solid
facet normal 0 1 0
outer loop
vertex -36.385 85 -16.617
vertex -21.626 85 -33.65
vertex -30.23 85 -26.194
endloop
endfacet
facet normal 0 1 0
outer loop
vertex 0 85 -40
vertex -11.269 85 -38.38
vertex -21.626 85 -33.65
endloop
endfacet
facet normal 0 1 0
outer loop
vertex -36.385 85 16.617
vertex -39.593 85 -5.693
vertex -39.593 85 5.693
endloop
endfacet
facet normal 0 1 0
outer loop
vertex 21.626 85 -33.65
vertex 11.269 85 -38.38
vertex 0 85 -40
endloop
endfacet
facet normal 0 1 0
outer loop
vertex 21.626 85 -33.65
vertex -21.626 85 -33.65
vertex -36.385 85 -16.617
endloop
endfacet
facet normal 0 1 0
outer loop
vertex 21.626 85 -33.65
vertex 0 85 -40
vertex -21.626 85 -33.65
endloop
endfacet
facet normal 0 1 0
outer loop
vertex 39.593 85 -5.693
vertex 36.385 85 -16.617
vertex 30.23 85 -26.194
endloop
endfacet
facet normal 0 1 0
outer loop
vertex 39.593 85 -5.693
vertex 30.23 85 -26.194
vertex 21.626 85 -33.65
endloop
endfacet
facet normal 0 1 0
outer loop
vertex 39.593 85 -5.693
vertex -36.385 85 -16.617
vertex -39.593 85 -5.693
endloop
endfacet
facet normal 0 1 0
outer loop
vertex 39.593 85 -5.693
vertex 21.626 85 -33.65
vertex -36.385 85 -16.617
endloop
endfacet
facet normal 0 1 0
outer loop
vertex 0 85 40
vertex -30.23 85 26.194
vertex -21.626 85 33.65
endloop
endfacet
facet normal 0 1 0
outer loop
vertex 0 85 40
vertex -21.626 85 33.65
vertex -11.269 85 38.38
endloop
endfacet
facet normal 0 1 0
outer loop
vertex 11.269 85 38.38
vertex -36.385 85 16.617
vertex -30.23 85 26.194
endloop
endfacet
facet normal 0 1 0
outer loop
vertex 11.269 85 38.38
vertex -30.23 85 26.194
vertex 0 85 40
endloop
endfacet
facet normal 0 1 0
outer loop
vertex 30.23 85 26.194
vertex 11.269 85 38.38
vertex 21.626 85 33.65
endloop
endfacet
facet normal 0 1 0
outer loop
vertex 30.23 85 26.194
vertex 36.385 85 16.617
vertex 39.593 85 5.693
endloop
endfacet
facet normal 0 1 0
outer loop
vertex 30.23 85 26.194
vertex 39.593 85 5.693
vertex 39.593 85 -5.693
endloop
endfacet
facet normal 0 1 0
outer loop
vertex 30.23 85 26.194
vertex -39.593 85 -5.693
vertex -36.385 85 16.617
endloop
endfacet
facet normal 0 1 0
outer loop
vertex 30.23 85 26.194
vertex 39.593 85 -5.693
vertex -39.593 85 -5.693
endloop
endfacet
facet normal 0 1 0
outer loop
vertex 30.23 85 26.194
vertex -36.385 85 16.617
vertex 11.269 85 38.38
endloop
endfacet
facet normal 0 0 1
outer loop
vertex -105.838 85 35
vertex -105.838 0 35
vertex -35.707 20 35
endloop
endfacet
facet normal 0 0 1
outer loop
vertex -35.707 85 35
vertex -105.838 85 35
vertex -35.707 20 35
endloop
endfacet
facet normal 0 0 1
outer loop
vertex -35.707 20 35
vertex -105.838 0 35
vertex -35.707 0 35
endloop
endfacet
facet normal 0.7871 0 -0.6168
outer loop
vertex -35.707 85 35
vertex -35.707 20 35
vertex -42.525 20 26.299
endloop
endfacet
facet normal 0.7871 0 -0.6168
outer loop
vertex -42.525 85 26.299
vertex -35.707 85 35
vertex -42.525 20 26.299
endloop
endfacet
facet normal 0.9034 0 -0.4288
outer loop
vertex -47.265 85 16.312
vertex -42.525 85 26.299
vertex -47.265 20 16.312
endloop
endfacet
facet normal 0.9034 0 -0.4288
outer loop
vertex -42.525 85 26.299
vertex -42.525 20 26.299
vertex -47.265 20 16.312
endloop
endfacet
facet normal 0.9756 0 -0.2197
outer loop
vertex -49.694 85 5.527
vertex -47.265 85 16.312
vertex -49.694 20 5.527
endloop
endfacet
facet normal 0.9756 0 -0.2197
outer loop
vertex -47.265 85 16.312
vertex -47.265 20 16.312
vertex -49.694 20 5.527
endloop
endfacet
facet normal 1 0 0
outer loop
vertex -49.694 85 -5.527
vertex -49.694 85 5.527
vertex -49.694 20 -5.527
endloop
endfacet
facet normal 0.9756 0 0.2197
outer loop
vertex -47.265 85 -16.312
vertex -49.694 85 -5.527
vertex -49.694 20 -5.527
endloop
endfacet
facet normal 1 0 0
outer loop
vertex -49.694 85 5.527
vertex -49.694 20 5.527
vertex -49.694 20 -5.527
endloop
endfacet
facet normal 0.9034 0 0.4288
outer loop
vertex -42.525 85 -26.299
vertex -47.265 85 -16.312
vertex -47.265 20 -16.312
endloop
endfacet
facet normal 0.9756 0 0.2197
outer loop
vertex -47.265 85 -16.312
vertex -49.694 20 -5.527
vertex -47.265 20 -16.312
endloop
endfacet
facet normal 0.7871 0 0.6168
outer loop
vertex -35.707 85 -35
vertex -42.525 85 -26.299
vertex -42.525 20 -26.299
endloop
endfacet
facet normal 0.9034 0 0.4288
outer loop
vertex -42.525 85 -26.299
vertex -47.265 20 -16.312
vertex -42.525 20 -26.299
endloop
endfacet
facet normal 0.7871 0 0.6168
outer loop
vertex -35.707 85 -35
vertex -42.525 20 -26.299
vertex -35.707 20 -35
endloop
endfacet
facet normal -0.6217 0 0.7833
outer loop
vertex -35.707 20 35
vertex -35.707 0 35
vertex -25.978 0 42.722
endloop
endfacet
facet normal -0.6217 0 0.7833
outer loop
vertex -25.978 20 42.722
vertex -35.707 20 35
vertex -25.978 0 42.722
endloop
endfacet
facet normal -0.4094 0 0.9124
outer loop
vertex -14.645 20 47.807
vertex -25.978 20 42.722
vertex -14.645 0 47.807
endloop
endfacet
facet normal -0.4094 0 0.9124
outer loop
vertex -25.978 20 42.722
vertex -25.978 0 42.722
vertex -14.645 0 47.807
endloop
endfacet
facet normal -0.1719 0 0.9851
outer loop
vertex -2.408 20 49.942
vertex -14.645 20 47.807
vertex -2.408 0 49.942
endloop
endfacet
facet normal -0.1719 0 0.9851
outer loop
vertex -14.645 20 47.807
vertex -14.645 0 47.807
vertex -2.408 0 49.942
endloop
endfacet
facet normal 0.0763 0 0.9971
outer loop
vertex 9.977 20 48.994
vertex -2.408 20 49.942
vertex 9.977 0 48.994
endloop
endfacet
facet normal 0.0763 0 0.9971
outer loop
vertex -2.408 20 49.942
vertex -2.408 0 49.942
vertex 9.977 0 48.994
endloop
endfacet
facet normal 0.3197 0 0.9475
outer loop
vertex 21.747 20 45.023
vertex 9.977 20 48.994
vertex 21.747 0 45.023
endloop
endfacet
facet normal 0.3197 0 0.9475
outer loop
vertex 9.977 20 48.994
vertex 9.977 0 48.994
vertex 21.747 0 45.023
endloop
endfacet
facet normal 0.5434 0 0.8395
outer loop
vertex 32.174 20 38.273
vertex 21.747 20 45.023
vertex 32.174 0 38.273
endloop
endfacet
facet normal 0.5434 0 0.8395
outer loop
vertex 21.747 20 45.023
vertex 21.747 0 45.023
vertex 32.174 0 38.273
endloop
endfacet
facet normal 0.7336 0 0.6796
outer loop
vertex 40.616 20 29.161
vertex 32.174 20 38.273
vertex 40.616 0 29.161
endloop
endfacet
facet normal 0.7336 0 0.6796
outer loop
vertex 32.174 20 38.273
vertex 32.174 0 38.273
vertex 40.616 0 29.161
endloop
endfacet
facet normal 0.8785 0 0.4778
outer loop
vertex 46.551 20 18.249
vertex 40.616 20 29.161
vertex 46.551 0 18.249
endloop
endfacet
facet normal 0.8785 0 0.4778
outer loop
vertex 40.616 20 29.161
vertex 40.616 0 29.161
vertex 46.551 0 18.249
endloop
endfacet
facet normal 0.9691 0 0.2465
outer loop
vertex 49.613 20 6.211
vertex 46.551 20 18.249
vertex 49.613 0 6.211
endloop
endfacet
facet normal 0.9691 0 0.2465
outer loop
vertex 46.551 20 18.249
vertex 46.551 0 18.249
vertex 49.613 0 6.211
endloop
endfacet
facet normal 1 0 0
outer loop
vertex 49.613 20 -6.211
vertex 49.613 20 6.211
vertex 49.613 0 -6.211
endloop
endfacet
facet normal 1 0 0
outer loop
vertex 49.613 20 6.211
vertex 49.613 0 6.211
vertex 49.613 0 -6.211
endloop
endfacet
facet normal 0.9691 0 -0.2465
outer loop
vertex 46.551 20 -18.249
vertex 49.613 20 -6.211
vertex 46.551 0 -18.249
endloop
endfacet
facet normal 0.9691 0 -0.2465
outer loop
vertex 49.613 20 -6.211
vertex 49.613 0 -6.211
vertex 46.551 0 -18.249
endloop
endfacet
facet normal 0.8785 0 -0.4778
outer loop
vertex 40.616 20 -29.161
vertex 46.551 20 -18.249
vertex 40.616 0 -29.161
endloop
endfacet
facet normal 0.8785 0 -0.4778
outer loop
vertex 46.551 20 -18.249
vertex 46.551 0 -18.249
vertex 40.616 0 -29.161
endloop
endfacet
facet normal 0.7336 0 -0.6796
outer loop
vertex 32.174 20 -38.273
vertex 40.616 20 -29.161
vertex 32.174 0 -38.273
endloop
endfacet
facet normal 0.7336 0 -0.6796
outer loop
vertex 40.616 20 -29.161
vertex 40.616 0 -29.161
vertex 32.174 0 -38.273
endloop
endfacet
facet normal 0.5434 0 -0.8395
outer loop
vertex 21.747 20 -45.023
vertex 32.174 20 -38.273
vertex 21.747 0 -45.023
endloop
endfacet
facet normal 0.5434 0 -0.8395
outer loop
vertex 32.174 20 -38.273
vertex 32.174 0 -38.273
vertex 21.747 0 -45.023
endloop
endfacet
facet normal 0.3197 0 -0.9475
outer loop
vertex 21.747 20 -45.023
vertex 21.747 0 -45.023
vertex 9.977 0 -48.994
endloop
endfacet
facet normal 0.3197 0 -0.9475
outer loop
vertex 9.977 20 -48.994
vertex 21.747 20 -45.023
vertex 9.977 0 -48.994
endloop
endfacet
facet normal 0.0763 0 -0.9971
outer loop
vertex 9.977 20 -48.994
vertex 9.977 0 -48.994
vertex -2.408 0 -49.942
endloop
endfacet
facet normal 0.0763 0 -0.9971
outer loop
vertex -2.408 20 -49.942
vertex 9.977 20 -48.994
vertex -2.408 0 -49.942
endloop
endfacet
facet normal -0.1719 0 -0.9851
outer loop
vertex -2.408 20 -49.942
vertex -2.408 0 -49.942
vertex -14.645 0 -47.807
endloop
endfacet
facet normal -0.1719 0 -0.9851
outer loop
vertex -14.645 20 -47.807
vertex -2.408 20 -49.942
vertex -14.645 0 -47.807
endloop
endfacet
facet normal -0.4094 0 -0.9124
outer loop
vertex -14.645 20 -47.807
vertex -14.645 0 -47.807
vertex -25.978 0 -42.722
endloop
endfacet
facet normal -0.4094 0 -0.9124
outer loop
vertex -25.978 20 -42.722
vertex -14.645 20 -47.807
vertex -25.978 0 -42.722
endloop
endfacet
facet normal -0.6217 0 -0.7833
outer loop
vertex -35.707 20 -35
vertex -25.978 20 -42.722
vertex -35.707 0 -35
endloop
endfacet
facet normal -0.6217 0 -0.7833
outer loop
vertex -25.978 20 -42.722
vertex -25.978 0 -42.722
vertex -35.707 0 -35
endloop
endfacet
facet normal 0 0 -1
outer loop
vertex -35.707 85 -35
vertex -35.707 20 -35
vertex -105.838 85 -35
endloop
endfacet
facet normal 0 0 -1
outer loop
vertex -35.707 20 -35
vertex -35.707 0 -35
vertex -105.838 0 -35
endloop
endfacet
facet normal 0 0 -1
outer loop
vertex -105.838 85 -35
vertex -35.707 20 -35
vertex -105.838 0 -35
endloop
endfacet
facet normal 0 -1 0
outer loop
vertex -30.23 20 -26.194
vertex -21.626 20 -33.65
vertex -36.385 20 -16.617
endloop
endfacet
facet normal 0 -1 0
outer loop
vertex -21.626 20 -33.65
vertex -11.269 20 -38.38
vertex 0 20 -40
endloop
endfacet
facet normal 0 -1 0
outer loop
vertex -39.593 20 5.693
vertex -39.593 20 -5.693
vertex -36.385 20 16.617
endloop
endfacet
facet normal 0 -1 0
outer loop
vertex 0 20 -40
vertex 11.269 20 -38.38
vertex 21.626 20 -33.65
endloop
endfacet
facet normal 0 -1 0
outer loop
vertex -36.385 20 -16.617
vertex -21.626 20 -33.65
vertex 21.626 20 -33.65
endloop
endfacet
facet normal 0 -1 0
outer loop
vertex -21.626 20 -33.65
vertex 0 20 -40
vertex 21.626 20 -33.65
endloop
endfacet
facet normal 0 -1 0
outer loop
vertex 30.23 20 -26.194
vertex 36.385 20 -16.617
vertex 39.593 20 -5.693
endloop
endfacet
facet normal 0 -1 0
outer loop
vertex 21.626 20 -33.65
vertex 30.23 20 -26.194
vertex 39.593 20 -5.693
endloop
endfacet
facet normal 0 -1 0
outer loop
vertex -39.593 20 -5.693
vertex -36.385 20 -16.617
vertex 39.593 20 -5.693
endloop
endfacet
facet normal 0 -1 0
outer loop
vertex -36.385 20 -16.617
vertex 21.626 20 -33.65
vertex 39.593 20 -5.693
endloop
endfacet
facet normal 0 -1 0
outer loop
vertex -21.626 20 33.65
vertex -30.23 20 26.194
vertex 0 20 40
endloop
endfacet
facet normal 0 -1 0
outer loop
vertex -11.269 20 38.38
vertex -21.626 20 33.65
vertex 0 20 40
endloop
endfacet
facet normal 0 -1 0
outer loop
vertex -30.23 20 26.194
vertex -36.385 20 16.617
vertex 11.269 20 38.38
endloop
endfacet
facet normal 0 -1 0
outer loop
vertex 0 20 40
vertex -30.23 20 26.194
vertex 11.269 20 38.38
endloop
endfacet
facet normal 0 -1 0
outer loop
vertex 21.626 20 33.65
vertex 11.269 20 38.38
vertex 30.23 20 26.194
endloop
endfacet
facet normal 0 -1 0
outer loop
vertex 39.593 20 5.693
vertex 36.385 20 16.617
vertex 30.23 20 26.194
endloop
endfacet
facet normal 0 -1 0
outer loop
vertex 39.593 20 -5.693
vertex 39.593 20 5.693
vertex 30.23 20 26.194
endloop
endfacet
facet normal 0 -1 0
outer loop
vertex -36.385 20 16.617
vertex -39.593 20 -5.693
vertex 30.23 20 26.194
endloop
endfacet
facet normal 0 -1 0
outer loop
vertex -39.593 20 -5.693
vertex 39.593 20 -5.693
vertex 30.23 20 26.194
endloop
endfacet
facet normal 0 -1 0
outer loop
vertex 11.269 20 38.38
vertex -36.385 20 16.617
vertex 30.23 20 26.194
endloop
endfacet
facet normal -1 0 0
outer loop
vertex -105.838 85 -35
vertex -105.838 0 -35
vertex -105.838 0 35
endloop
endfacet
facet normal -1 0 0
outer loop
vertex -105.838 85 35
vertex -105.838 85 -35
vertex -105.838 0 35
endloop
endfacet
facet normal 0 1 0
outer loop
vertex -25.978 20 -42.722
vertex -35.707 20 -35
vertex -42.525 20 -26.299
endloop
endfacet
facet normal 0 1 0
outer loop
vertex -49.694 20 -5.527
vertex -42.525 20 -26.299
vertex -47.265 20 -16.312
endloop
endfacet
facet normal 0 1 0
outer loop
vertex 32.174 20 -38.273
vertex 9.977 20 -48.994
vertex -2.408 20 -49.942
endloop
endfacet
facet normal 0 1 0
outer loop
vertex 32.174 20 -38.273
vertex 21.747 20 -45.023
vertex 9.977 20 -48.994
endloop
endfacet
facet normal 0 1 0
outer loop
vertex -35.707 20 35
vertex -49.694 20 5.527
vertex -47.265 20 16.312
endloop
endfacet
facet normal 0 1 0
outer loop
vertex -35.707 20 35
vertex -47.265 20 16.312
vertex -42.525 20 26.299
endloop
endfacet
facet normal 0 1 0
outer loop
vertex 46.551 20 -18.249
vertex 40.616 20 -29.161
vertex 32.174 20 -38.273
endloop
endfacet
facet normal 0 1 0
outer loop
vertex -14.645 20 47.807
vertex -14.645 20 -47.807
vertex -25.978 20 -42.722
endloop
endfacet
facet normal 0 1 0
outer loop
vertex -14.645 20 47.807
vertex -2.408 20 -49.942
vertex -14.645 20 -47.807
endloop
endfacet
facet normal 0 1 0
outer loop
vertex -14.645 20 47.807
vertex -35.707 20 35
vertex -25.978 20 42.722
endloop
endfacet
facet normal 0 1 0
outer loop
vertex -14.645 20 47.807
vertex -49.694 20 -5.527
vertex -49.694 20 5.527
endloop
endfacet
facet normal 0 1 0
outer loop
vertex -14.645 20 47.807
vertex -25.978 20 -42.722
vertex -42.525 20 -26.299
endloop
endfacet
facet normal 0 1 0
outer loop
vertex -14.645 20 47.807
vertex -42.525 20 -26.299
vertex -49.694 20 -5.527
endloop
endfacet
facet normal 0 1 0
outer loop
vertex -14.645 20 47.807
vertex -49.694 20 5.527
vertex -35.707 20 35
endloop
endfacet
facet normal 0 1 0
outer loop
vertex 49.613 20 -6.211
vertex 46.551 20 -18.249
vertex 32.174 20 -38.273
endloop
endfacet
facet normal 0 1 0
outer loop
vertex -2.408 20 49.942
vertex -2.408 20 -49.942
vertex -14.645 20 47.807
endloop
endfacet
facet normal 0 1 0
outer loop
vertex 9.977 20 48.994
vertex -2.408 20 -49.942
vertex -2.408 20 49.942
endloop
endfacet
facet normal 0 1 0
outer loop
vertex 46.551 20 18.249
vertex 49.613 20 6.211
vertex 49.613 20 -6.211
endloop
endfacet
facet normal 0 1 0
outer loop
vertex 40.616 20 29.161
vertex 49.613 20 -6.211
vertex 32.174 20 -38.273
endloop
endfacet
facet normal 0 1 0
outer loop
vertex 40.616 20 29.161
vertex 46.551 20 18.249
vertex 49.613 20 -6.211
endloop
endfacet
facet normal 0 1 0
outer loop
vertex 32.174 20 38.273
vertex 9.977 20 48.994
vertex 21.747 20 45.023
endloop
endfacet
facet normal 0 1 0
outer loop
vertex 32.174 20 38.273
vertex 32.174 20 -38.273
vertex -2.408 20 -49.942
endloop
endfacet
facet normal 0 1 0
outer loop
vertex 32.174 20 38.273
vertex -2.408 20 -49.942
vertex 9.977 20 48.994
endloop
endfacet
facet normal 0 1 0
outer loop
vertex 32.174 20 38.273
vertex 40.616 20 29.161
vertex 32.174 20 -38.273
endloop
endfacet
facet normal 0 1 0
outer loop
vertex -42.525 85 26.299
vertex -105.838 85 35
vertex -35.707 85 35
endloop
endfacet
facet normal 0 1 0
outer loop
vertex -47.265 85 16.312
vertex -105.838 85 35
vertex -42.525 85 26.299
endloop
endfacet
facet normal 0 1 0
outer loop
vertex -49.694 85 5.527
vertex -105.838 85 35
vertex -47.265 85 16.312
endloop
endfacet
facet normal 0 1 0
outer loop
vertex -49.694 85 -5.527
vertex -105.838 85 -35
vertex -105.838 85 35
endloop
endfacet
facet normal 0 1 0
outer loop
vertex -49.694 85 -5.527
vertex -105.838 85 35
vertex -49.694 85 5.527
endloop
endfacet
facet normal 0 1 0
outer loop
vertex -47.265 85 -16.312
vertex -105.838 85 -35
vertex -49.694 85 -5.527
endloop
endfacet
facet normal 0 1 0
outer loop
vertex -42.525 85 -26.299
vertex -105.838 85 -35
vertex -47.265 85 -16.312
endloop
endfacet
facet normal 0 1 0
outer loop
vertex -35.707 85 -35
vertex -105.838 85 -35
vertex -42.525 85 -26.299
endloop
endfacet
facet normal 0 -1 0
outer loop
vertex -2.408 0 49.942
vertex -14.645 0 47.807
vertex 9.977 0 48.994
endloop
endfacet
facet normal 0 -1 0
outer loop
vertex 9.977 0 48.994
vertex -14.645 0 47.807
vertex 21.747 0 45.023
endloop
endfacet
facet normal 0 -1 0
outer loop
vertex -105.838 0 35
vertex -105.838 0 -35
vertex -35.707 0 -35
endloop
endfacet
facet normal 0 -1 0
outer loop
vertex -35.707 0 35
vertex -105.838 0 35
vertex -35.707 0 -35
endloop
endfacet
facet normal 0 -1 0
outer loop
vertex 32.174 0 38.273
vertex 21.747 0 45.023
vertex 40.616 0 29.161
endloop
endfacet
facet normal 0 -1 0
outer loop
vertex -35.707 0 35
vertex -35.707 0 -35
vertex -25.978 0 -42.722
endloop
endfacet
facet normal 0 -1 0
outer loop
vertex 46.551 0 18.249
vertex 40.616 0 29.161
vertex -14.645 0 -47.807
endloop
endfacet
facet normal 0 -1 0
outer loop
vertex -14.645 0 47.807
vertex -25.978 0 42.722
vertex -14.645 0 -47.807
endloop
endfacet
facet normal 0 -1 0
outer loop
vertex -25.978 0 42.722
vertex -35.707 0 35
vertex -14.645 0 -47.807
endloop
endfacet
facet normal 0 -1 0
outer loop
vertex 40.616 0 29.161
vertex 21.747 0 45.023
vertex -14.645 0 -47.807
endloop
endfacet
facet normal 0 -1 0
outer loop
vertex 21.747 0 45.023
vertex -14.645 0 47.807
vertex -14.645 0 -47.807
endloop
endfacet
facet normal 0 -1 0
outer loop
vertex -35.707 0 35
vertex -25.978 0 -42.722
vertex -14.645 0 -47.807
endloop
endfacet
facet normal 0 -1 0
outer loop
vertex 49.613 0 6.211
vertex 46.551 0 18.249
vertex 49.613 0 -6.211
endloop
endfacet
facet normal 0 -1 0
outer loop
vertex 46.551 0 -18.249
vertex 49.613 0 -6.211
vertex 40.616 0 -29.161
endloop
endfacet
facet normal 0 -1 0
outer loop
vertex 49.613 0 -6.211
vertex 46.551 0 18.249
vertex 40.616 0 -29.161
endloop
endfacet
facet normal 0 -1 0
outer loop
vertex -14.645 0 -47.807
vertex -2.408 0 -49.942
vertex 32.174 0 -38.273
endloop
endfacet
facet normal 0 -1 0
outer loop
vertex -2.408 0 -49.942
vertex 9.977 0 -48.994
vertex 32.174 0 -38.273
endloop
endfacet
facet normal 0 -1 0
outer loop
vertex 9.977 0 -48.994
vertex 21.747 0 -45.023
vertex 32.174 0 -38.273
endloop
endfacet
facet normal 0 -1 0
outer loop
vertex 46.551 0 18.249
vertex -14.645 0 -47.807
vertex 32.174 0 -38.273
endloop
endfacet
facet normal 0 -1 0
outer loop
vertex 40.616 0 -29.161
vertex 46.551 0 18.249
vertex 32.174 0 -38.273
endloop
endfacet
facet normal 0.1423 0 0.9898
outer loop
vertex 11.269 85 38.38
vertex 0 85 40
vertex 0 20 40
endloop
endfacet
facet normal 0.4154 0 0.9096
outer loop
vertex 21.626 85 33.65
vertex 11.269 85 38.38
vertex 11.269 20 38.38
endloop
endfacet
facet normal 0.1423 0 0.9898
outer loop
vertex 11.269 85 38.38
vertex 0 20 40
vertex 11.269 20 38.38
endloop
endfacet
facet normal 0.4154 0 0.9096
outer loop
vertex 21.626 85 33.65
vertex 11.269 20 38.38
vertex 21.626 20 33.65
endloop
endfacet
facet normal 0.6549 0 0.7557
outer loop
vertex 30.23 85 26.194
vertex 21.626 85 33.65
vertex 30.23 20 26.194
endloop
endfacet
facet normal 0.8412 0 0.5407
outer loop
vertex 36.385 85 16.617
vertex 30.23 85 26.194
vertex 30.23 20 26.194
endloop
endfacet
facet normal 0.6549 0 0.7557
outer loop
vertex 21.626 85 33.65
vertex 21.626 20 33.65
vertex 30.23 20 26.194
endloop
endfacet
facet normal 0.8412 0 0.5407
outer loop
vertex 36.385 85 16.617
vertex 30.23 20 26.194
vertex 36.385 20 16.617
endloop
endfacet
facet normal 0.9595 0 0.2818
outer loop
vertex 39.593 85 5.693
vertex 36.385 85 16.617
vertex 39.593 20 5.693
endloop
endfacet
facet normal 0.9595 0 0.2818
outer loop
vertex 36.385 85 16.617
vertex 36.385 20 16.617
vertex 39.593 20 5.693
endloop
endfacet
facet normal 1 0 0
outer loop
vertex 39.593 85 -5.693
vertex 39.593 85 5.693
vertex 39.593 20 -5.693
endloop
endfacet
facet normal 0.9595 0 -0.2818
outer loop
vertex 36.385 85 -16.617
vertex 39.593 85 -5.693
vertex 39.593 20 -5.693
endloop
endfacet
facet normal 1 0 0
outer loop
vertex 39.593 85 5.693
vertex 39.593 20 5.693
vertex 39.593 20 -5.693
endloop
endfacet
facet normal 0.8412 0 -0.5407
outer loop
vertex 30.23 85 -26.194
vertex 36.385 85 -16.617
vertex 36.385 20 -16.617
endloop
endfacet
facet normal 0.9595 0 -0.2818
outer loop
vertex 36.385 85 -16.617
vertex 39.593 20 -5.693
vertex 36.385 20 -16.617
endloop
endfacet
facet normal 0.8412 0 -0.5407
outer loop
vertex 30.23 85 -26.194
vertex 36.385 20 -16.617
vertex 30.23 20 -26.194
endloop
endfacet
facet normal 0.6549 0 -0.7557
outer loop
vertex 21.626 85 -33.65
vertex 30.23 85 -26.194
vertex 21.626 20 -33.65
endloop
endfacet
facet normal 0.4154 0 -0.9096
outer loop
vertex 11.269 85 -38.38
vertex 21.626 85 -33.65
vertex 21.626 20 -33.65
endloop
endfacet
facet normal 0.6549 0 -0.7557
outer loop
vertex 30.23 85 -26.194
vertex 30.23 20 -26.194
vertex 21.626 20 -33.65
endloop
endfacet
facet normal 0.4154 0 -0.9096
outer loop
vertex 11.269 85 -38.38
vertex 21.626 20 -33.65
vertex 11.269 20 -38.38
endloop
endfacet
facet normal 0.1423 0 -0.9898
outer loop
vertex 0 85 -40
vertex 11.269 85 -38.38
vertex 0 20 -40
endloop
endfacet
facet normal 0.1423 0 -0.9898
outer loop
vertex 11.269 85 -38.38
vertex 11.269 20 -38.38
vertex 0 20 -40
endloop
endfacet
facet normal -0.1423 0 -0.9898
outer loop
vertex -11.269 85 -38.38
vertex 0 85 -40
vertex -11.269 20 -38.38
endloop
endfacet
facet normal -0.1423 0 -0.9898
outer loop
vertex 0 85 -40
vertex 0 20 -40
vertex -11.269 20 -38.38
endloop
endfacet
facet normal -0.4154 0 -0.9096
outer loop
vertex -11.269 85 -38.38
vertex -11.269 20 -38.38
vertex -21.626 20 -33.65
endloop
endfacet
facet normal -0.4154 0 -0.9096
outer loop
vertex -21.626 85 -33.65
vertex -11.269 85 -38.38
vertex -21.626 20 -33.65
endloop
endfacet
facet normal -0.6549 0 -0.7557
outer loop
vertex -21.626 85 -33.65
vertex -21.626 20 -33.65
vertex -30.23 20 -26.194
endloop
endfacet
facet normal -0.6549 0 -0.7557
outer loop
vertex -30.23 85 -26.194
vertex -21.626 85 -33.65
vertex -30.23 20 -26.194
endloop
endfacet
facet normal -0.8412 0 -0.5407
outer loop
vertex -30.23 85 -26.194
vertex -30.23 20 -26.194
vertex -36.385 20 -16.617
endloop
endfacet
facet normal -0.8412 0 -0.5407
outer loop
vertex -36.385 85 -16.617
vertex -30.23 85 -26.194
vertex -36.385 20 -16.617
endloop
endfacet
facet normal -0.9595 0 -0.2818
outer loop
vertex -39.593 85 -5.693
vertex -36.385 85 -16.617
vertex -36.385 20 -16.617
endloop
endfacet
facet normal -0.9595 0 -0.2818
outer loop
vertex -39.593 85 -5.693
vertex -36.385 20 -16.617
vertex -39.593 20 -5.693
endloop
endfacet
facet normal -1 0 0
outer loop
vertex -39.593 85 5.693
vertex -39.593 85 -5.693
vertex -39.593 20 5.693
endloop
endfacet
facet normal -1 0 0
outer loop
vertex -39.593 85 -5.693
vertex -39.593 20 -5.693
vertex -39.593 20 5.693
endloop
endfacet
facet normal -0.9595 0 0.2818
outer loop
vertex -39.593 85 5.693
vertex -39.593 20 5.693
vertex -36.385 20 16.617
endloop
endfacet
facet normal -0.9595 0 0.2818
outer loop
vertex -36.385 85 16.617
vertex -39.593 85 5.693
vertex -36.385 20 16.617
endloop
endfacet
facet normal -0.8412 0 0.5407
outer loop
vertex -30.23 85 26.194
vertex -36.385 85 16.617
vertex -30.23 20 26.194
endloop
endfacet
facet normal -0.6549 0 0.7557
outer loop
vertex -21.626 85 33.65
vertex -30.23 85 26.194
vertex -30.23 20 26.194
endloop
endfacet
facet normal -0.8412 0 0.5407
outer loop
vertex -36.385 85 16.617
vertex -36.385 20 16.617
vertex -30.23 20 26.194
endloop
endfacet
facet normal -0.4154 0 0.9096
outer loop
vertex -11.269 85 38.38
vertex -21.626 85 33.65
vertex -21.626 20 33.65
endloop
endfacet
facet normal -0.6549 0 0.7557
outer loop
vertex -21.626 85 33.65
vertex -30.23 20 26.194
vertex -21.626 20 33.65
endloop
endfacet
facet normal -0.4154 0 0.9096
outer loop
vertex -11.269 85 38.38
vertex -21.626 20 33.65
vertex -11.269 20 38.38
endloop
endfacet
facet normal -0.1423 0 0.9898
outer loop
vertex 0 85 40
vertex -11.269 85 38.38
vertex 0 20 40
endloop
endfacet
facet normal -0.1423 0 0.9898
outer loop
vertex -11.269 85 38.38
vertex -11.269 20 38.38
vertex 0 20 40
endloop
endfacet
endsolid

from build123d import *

# Parameters (mm, degrees)
SKETCH1_R      = 50
EXTRUDE1_DEPTH = 20
SKETCH2_R      = 40
EXTRUDE2_DEPTH = 65
EXTRUDE3_DEPTH = 85


with BuildPart() as part:
    # Sketch1 → Extrude1 (new body)
    with BuildSketch(Plane(origin=(0, 0, 0), x_dir=(1, 0, 0), z_dir=(0, 1, 0))):
        with Locations(Location((0, 0, 0), (0, 0, 270))):  # turned: the seam where the file's is
            Circle(SKETCH1_R)
    extrude(amount=EXTRUDE1_DEPTH)

    # Sketch3 → Extrude3 (add)
    with BuildSketch(Plane(origin=(0, 0, 0), x_dir=(1, 0, 0), z_dir=(0, 1, 0))):
        with BuildLine():
            Line((-105.838179272, 35), (-105.838179272, -35))
            Line((-105.838179272, -35), (-35.707142143, -35))
            ThreePointArc((-35.707142143, -35), (-50, 0), (-35.707142143, 35))
            Line((-35.707142143, 35), (-105.838179272, 35))
        make_face()
    extrude(amount=EXTRUDE3_DEPTH)


with BuildPart() as body_2:
    # Sketch2 → Extrude2 (new body)
    with BuildSketch(Plane(origin=(0, 20, 0), x_dir=(-1, 0, 0), z_dir=(0, 1, 0))):
        with Locations(Location((0, 0, 0), (0, 0, 90))):  # turned: the seam where the file's is
            Circle(SKETCH2_R)
    extrude(amount=EXTRUDE2_DEPTH)


solid = Compound([part.part, body_2.part])
